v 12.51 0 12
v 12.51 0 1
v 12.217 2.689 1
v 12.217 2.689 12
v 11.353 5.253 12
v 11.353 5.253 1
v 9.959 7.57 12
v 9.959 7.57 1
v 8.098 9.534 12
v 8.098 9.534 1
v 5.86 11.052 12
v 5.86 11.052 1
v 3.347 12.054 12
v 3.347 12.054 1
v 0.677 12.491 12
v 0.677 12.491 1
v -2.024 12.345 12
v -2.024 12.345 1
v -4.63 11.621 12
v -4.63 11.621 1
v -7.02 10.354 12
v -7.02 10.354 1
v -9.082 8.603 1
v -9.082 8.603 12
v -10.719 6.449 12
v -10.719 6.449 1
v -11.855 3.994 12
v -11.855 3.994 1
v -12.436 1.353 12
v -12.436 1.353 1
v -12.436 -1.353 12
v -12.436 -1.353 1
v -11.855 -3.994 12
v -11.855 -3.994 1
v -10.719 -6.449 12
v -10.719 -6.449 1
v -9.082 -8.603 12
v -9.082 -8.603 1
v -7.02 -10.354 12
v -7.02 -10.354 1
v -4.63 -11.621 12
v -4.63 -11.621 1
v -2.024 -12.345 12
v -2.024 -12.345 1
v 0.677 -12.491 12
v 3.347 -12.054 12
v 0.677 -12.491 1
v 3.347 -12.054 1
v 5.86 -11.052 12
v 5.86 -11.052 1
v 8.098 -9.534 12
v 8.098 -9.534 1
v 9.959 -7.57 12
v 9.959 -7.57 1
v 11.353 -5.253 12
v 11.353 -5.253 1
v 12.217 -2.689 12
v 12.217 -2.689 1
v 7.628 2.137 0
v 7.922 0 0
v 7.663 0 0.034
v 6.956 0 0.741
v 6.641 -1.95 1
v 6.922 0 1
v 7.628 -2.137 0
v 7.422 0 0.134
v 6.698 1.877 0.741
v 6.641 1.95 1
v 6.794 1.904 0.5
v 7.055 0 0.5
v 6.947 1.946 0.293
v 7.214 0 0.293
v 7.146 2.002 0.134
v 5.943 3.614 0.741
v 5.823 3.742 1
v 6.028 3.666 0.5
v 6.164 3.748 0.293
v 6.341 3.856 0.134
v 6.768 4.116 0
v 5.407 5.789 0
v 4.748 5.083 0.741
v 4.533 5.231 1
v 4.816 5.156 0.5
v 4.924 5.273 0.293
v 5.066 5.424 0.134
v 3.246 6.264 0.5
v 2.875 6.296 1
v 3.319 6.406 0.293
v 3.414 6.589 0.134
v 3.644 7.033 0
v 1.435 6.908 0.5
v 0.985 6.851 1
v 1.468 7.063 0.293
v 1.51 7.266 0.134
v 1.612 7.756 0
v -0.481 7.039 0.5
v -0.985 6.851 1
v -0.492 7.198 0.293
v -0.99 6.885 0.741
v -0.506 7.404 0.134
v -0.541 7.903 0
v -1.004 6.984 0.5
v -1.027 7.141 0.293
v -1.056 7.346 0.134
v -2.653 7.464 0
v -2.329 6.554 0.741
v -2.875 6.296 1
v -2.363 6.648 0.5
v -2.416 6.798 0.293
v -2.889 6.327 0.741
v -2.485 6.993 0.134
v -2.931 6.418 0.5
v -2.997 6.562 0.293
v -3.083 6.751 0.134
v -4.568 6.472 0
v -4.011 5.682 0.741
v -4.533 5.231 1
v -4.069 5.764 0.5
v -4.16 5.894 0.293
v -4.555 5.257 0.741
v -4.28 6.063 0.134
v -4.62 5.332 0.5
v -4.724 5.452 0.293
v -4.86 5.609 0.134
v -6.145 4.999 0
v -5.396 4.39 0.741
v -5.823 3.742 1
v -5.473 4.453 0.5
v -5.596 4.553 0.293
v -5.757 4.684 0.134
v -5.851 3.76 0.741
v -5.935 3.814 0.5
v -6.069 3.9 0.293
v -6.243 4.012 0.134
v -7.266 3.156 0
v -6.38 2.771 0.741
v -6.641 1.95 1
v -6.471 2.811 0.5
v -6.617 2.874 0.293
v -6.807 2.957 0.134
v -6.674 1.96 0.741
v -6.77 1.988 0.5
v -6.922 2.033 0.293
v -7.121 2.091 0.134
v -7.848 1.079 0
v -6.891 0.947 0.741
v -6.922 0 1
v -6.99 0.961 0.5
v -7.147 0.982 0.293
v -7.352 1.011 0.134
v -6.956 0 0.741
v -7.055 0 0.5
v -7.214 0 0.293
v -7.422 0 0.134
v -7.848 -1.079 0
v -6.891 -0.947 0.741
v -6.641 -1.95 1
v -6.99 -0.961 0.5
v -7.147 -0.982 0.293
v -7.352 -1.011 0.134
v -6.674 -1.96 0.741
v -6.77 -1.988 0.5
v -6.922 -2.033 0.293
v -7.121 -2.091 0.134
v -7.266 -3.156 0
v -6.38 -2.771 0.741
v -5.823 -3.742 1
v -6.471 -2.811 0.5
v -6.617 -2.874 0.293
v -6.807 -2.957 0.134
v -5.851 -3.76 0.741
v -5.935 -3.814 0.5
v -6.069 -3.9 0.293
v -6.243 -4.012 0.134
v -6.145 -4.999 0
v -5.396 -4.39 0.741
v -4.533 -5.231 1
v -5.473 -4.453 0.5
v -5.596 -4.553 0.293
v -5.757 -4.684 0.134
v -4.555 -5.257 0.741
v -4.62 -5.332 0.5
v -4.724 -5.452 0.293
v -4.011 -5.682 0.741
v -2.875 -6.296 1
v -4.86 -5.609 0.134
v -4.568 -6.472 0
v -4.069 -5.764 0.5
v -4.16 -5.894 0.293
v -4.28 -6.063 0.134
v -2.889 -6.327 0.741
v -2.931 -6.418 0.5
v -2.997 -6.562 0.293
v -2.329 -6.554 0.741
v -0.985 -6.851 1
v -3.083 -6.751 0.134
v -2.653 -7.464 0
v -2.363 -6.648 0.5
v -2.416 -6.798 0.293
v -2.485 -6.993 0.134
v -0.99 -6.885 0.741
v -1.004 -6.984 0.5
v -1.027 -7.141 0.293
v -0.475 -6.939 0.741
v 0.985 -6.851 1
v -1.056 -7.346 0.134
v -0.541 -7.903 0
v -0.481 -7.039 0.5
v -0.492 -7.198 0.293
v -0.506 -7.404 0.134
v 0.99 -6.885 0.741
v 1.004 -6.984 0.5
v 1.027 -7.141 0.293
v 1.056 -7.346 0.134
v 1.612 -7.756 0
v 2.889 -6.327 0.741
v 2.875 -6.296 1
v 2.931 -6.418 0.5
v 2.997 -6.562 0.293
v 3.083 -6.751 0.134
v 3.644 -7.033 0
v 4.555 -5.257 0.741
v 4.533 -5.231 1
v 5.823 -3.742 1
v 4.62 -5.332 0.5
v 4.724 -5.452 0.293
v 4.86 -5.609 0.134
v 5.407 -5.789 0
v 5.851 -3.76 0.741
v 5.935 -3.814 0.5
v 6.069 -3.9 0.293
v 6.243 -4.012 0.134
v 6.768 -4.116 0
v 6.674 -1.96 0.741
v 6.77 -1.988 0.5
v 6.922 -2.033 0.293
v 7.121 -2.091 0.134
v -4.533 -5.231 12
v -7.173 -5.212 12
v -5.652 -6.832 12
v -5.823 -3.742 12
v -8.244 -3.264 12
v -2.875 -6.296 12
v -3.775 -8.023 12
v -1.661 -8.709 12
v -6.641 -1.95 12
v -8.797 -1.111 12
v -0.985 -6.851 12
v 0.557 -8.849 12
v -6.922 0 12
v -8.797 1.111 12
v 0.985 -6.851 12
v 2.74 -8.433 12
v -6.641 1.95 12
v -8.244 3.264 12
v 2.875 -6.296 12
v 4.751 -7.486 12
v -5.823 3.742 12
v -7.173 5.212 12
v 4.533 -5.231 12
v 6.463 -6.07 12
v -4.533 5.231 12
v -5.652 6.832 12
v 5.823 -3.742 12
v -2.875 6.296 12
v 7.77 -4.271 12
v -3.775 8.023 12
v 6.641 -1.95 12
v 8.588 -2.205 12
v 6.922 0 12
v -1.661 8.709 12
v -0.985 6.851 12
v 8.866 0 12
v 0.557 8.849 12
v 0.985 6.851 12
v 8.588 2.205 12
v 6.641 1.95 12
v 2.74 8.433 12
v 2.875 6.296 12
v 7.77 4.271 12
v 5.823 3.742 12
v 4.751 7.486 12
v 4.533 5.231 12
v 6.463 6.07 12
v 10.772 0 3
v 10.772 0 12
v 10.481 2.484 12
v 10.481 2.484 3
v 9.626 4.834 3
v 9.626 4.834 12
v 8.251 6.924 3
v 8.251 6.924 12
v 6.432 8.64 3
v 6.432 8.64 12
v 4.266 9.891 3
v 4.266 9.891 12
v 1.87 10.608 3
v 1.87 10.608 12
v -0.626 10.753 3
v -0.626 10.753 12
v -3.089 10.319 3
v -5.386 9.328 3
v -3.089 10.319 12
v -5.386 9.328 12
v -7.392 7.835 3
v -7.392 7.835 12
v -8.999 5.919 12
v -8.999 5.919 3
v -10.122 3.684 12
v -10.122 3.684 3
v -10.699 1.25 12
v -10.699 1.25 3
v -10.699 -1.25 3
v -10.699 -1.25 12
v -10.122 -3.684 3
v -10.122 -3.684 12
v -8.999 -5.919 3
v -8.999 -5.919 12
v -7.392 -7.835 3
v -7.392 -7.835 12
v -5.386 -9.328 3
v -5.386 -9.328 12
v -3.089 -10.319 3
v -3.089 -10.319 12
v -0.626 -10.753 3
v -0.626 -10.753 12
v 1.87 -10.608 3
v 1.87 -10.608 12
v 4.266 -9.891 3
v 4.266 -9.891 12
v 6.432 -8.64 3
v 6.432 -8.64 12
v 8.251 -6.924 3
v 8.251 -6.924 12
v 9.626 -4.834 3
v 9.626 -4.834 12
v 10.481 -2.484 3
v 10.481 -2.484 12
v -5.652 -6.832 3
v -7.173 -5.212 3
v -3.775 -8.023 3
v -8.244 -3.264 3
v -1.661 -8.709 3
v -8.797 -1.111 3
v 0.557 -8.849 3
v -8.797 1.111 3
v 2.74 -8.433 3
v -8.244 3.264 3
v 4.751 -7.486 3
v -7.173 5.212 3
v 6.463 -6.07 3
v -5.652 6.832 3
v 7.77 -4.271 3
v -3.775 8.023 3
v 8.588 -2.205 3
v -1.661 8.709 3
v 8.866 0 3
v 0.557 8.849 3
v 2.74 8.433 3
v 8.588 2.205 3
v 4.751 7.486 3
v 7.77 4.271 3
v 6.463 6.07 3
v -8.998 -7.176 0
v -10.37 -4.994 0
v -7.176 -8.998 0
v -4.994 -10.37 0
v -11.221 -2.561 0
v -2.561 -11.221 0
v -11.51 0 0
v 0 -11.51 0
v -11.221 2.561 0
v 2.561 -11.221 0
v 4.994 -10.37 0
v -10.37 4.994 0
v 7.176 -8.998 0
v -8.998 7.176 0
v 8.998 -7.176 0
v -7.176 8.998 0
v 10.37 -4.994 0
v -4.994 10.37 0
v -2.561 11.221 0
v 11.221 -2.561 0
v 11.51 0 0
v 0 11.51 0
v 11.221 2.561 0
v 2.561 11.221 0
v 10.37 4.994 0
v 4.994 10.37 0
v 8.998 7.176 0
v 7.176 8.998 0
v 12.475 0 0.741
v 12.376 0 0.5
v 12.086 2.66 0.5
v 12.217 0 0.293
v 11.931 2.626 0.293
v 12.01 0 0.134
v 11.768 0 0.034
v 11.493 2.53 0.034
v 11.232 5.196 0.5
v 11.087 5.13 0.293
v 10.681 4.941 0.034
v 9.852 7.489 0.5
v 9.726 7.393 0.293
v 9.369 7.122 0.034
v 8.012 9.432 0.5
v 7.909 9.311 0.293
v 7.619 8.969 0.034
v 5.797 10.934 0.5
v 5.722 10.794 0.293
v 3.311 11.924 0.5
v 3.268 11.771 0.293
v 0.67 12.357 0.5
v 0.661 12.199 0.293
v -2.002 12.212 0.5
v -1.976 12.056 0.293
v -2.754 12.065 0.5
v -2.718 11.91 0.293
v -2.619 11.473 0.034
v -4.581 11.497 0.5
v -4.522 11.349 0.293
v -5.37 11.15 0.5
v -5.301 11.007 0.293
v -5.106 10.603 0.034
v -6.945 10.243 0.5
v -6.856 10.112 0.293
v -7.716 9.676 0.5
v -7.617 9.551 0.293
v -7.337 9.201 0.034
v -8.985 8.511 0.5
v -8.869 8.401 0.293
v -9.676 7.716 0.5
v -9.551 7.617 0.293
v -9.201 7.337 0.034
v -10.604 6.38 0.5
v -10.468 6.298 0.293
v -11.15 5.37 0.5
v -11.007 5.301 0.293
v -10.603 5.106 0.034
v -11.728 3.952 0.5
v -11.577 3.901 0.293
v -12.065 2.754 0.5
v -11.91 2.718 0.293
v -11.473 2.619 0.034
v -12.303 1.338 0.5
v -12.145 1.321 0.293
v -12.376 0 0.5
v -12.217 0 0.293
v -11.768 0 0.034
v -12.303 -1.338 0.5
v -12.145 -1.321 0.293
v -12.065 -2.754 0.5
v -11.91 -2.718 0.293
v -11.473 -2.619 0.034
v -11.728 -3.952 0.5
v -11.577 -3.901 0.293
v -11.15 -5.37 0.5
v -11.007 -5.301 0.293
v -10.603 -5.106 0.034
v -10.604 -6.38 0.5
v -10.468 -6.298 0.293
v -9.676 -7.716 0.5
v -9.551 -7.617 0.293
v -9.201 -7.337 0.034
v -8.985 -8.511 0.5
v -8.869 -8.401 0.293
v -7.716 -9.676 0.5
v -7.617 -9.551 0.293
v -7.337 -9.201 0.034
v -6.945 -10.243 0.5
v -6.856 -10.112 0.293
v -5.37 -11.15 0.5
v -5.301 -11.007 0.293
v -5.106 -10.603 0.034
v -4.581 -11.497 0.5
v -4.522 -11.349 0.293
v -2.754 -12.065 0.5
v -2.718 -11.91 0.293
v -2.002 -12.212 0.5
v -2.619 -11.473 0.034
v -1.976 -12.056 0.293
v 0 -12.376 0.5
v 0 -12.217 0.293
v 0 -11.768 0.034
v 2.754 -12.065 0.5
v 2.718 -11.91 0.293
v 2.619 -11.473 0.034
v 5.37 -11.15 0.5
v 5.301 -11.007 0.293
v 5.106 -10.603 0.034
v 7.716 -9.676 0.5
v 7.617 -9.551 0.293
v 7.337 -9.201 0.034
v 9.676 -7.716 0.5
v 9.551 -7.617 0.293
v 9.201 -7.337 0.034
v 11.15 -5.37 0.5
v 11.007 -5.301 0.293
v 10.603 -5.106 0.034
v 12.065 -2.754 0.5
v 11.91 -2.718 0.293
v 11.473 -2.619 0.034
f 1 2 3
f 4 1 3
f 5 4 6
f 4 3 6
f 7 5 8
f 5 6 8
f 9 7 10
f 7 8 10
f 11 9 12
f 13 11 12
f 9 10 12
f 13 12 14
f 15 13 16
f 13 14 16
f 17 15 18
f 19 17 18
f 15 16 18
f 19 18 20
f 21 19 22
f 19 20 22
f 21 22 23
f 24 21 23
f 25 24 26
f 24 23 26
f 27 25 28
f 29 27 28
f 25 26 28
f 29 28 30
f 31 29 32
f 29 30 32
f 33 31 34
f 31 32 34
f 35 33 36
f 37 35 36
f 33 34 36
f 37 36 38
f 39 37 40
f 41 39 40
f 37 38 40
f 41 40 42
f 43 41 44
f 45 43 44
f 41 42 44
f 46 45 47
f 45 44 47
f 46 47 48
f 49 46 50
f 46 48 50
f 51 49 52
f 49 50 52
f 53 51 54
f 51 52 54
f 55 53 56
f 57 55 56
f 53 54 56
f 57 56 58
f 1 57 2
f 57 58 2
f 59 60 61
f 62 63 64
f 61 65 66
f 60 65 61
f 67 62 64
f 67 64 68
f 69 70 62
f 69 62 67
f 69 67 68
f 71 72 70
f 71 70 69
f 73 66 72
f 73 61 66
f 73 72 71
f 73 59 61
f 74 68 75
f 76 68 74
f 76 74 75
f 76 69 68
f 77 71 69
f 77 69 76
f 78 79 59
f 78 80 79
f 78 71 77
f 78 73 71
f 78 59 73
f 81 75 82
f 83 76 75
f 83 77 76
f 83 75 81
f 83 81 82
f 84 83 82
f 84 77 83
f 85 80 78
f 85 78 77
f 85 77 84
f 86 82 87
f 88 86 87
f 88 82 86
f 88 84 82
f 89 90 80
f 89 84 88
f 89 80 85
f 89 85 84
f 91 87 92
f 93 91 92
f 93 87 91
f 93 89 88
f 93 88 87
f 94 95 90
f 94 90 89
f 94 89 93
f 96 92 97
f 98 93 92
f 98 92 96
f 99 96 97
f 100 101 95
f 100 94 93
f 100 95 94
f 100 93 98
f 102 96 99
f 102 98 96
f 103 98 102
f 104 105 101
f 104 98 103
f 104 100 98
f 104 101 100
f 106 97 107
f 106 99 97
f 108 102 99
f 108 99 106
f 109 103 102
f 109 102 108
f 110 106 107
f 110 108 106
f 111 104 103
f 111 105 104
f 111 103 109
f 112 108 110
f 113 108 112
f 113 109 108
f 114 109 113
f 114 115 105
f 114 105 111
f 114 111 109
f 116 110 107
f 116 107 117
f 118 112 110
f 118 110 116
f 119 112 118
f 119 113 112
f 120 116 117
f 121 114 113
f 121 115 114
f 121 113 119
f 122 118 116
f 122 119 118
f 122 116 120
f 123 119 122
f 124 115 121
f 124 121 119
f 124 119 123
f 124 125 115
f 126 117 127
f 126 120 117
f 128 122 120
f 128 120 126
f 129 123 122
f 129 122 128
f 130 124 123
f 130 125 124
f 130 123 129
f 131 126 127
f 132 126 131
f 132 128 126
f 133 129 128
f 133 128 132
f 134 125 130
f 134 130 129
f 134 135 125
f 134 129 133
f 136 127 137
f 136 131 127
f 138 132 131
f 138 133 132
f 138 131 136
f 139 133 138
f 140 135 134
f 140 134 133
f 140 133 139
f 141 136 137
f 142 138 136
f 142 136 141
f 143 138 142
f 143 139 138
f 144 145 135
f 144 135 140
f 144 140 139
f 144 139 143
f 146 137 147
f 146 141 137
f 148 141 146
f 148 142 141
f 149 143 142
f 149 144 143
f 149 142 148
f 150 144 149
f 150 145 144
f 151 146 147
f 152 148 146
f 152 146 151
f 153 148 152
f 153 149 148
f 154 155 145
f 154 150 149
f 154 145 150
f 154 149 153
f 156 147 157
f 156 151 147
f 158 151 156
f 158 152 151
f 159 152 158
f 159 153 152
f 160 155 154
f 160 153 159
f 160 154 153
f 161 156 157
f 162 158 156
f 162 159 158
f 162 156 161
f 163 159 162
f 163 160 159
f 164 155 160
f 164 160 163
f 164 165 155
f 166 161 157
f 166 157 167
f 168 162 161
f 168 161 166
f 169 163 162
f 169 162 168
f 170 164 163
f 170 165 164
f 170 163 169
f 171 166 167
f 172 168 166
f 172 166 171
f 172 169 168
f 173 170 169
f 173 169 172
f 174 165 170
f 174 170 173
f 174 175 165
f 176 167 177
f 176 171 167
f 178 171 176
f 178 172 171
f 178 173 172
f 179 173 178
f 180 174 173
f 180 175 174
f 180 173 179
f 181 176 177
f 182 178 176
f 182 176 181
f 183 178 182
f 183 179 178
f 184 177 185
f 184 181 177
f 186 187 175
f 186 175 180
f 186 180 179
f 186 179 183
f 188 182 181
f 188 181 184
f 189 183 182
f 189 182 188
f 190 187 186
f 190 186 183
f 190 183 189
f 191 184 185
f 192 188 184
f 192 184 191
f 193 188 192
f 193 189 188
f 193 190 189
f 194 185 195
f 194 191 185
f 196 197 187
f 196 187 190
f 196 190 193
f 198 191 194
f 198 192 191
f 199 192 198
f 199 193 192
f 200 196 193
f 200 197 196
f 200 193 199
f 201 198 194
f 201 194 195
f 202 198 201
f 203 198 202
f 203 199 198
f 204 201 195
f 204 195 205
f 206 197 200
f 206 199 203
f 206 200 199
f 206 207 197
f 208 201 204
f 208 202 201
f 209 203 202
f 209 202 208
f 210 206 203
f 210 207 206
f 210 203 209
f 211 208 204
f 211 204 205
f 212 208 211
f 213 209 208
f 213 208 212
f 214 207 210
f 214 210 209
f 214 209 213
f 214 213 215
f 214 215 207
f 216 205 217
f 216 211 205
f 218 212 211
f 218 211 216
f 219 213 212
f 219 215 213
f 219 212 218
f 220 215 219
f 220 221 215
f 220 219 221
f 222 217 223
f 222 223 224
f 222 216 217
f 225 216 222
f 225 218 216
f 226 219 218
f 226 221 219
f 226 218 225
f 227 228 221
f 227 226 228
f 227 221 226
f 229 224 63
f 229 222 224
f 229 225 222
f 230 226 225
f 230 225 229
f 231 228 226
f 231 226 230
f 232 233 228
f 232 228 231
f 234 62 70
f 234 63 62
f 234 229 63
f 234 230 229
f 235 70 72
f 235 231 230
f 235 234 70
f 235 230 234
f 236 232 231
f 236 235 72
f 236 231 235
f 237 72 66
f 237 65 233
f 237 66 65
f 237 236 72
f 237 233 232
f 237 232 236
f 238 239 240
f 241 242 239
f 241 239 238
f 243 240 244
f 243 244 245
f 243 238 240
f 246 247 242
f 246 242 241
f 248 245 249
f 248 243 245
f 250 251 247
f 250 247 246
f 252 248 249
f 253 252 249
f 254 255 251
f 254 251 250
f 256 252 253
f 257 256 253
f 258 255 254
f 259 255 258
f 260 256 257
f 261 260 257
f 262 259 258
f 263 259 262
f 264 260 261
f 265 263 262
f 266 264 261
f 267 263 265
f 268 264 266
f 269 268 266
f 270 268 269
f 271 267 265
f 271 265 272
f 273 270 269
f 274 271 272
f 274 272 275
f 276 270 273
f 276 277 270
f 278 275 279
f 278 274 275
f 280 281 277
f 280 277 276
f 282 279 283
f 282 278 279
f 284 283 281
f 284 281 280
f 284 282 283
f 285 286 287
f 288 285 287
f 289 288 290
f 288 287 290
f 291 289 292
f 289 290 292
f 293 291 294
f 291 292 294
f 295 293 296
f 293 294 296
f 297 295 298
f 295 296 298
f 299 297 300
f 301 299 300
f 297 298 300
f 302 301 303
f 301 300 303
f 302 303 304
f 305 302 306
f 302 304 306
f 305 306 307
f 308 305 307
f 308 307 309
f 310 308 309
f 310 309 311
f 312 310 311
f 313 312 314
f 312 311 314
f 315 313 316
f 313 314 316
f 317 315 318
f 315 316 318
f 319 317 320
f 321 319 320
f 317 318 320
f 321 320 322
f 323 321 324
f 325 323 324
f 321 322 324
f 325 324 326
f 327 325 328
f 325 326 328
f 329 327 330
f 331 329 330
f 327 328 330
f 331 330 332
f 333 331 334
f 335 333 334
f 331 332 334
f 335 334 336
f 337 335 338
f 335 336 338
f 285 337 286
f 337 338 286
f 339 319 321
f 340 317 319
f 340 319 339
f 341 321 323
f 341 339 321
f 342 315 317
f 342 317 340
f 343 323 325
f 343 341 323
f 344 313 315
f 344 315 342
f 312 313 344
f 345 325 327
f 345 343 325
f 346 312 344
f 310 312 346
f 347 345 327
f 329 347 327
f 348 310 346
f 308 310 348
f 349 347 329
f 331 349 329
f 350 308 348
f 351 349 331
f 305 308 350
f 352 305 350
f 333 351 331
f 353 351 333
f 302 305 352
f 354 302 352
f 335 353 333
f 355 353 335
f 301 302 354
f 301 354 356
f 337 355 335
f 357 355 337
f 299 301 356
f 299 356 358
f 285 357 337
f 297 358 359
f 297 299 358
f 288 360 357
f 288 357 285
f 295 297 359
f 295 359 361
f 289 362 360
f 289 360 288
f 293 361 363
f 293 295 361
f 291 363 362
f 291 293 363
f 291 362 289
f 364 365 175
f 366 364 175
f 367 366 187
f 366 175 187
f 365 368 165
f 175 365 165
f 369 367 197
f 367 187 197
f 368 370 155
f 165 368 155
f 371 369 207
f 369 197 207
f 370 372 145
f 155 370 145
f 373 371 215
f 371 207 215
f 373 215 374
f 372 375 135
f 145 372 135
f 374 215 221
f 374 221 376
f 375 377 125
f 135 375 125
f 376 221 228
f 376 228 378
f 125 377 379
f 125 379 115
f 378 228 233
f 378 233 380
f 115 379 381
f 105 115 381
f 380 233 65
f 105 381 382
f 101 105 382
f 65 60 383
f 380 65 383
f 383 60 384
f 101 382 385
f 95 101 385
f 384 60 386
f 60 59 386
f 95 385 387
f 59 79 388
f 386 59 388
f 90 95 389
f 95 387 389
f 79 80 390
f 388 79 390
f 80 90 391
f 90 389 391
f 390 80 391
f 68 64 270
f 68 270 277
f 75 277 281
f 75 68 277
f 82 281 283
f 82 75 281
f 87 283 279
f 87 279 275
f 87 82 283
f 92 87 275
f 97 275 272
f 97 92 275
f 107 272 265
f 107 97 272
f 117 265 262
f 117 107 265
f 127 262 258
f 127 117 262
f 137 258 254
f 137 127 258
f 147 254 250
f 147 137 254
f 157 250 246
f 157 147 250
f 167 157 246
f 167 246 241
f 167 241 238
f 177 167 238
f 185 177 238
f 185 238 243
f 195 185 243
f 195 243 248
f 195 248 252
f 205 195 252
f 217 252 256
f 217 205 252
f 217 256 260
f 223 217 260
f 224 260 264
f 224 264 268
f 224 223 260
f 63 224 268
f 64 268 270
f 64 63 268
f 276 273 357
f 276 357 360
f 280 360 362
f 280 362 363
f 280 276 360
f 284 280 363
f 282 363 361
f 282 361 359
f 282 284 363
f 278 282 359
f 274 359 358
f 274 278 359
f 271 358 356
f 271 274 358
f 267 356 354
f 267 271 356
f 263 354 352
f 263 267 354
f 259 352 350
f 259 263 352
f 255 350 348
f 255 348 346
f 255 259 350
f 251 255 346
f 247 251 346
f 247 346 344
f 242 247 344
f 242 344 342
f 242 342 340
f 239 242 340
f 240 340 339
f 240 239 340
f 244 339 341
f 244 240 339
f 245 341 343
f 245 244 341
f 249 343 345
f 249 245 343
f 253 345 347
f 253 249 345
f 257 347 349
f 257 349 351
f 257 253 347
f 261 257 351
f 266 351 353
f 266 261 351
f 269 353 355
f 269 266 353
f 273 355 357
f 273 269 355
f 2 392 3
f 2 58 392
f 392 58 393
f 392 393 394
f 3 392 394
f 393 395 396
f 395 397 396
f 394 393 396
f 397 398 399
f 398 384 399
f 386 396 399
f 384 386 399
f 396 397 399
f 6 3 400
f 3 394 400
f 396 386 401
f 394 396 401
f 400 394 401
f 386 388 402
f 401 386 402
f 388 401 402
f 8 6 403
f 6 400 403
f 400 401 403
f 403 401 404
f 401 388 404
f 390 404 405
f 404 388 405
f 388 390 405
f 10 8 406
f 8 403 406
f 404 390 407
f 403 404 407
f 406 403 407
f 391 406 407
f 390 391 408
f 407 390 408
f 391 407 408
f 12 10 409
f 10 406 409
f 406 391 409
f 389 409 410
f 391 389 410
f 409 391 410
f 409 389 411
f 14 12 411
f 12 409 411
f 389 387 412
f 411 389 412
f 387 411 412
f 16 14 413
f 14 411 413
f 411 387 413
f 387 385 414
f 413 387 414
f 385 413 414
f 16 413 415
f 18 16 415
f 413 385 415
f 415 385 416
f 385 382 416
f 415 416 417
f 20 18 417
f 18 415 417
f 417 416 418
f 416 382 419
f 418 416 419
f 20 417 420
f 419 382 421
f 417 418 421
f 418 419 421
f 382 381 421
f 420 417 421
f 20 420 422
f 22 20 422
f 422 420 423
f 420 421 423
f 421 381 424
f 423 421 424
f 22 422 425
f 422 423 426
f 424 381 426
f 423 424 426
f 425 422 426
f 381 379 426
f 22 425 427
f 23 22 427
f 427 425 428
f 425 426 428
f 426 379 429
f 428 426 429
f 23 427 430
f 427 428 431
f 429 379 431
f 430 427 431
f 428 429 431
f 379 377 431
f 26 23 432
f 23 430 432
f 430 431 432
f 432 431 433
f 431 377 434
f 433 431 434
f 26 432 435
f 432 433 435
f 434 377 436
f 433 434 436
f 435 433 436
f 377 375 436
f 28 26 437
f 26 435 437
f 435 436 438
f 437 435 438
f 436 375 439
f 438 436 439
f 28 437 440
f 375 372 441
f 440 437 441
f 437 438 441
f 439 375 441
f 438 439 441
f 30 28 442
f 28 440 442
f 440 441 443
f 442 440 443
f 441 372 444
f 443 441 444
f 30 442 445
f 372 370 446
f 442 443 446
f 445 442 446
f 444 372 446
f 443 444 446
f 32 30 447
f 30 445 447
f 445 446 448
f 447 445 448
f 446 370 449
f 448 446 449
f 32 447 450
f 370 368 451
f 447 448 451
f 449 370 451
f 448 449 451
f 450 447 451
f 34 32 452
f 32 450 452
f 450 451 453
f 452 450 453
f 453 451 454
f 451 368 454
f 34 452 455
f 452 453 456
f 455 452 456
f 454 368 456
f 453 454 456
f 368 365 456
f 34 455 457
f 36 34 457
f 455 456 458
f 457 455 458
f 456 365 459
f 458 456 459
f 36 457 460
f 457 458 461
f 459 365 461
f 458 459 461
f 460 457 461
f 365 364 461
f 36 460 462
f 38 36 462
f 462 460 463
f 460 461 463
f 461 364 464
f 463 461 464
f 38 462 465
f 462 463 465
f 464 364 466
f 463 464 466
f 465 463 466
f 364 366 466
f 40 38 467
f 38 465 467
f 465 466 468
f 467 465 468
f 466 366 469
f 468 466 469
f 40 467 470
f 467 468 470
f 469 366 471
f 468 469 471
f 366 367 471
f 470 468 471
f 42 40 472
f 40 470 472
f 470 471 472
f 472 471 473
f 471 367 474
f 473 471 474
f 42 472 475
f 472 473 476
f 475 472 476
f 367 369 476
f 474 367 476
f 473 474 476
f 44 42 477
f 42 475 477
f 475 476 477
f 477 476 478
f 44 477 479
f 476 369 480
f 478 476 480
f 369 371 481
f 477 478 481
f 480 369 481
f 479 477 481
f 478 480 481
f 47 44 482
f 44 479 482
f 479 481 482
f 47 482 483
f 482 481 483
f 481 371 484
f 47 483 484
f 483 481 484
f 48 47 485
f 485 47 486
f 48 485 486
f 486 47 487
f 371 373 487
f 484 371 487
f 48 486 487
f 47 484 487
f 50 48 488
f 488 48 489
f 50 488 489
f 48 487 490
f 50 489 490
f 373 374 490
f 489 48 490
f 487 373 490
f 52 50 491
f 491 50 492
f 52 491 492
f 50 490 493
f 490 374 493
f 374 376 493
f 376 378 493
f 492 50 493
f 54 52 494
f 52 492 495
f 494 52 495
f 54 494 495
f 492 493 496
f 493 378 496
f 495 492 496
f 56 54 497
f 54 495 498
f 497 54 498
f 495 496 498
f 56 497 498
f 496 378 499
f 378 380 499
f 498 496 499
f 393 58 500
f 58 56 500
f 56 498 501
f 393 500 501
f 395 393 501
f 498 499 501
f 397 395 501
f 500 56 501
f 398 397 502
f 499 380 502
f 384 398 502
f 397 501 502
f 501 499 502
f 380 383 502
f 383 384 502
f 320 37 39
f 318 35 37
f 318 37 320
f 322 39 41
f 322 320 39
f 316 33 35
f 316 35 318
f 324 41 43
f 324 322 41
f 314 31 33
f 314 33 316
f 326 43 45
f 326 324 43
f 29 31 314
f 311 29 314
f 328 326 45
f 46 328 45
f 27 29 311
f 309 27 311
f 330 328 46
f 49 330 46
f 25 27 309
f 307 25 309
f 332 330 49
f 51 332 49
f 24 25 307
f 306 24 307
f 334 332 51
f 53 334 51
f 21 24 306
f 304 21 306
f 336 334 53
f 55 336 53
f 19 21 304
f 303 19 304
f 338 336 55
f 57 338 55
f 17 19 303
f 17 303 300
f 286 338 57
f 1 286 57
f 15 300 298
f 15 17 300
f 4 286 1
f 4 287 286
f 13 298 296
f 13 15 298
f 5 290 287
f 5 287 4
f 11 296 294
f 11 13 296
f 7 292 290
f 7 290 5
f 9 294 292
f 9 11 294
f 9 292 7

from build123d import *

# Parameters (mm, degrees)
SKETCH1_R           = 12.5095
SKETCH1_R_2         = 6.9215
BOSS_EXTRUDE1_DEPTH = 12
FILLET1_R           = 1
SKETCH2_R           = 10.7715
SKETCH2_R_2         = 8.8665
CUT_EXTRUDE1_DEPTH  = 9


with BuildPart() as part:
    # Sketch1 → Boss-Extrude1 (new body)
    with BuildSketch(Plane.XY):
        Circle(SKETCH1_R)
        Circle(SKETCH1_R_2, mode=Mode.SUBTRACT)
    extrude(amount=BOSS_EXTRUDE1_DEPTH)

    # Fillet1
    fillet1_edges = [part.edges().sort_by_distance(p)[0] for p in [
        (-12.5095, 0, 0),
        (-6.9215, 0, 0),
    ]]
    fillet(fillet1_edges, radius=FILLET1_R)

    # Sketch2 → Cut-Extrude1 (cut)
    with BuildSketch(Plane.XY.offset(12)):
        Circle(SKETCH2_R)
        Circle(SKETCH2_R_2, mode=Mode.SUBTRACT)
    extrude(amount=-CUT_EXTRUDE1_DEPTH, mode=Mode.SUBTRACT)


solid = part.part
